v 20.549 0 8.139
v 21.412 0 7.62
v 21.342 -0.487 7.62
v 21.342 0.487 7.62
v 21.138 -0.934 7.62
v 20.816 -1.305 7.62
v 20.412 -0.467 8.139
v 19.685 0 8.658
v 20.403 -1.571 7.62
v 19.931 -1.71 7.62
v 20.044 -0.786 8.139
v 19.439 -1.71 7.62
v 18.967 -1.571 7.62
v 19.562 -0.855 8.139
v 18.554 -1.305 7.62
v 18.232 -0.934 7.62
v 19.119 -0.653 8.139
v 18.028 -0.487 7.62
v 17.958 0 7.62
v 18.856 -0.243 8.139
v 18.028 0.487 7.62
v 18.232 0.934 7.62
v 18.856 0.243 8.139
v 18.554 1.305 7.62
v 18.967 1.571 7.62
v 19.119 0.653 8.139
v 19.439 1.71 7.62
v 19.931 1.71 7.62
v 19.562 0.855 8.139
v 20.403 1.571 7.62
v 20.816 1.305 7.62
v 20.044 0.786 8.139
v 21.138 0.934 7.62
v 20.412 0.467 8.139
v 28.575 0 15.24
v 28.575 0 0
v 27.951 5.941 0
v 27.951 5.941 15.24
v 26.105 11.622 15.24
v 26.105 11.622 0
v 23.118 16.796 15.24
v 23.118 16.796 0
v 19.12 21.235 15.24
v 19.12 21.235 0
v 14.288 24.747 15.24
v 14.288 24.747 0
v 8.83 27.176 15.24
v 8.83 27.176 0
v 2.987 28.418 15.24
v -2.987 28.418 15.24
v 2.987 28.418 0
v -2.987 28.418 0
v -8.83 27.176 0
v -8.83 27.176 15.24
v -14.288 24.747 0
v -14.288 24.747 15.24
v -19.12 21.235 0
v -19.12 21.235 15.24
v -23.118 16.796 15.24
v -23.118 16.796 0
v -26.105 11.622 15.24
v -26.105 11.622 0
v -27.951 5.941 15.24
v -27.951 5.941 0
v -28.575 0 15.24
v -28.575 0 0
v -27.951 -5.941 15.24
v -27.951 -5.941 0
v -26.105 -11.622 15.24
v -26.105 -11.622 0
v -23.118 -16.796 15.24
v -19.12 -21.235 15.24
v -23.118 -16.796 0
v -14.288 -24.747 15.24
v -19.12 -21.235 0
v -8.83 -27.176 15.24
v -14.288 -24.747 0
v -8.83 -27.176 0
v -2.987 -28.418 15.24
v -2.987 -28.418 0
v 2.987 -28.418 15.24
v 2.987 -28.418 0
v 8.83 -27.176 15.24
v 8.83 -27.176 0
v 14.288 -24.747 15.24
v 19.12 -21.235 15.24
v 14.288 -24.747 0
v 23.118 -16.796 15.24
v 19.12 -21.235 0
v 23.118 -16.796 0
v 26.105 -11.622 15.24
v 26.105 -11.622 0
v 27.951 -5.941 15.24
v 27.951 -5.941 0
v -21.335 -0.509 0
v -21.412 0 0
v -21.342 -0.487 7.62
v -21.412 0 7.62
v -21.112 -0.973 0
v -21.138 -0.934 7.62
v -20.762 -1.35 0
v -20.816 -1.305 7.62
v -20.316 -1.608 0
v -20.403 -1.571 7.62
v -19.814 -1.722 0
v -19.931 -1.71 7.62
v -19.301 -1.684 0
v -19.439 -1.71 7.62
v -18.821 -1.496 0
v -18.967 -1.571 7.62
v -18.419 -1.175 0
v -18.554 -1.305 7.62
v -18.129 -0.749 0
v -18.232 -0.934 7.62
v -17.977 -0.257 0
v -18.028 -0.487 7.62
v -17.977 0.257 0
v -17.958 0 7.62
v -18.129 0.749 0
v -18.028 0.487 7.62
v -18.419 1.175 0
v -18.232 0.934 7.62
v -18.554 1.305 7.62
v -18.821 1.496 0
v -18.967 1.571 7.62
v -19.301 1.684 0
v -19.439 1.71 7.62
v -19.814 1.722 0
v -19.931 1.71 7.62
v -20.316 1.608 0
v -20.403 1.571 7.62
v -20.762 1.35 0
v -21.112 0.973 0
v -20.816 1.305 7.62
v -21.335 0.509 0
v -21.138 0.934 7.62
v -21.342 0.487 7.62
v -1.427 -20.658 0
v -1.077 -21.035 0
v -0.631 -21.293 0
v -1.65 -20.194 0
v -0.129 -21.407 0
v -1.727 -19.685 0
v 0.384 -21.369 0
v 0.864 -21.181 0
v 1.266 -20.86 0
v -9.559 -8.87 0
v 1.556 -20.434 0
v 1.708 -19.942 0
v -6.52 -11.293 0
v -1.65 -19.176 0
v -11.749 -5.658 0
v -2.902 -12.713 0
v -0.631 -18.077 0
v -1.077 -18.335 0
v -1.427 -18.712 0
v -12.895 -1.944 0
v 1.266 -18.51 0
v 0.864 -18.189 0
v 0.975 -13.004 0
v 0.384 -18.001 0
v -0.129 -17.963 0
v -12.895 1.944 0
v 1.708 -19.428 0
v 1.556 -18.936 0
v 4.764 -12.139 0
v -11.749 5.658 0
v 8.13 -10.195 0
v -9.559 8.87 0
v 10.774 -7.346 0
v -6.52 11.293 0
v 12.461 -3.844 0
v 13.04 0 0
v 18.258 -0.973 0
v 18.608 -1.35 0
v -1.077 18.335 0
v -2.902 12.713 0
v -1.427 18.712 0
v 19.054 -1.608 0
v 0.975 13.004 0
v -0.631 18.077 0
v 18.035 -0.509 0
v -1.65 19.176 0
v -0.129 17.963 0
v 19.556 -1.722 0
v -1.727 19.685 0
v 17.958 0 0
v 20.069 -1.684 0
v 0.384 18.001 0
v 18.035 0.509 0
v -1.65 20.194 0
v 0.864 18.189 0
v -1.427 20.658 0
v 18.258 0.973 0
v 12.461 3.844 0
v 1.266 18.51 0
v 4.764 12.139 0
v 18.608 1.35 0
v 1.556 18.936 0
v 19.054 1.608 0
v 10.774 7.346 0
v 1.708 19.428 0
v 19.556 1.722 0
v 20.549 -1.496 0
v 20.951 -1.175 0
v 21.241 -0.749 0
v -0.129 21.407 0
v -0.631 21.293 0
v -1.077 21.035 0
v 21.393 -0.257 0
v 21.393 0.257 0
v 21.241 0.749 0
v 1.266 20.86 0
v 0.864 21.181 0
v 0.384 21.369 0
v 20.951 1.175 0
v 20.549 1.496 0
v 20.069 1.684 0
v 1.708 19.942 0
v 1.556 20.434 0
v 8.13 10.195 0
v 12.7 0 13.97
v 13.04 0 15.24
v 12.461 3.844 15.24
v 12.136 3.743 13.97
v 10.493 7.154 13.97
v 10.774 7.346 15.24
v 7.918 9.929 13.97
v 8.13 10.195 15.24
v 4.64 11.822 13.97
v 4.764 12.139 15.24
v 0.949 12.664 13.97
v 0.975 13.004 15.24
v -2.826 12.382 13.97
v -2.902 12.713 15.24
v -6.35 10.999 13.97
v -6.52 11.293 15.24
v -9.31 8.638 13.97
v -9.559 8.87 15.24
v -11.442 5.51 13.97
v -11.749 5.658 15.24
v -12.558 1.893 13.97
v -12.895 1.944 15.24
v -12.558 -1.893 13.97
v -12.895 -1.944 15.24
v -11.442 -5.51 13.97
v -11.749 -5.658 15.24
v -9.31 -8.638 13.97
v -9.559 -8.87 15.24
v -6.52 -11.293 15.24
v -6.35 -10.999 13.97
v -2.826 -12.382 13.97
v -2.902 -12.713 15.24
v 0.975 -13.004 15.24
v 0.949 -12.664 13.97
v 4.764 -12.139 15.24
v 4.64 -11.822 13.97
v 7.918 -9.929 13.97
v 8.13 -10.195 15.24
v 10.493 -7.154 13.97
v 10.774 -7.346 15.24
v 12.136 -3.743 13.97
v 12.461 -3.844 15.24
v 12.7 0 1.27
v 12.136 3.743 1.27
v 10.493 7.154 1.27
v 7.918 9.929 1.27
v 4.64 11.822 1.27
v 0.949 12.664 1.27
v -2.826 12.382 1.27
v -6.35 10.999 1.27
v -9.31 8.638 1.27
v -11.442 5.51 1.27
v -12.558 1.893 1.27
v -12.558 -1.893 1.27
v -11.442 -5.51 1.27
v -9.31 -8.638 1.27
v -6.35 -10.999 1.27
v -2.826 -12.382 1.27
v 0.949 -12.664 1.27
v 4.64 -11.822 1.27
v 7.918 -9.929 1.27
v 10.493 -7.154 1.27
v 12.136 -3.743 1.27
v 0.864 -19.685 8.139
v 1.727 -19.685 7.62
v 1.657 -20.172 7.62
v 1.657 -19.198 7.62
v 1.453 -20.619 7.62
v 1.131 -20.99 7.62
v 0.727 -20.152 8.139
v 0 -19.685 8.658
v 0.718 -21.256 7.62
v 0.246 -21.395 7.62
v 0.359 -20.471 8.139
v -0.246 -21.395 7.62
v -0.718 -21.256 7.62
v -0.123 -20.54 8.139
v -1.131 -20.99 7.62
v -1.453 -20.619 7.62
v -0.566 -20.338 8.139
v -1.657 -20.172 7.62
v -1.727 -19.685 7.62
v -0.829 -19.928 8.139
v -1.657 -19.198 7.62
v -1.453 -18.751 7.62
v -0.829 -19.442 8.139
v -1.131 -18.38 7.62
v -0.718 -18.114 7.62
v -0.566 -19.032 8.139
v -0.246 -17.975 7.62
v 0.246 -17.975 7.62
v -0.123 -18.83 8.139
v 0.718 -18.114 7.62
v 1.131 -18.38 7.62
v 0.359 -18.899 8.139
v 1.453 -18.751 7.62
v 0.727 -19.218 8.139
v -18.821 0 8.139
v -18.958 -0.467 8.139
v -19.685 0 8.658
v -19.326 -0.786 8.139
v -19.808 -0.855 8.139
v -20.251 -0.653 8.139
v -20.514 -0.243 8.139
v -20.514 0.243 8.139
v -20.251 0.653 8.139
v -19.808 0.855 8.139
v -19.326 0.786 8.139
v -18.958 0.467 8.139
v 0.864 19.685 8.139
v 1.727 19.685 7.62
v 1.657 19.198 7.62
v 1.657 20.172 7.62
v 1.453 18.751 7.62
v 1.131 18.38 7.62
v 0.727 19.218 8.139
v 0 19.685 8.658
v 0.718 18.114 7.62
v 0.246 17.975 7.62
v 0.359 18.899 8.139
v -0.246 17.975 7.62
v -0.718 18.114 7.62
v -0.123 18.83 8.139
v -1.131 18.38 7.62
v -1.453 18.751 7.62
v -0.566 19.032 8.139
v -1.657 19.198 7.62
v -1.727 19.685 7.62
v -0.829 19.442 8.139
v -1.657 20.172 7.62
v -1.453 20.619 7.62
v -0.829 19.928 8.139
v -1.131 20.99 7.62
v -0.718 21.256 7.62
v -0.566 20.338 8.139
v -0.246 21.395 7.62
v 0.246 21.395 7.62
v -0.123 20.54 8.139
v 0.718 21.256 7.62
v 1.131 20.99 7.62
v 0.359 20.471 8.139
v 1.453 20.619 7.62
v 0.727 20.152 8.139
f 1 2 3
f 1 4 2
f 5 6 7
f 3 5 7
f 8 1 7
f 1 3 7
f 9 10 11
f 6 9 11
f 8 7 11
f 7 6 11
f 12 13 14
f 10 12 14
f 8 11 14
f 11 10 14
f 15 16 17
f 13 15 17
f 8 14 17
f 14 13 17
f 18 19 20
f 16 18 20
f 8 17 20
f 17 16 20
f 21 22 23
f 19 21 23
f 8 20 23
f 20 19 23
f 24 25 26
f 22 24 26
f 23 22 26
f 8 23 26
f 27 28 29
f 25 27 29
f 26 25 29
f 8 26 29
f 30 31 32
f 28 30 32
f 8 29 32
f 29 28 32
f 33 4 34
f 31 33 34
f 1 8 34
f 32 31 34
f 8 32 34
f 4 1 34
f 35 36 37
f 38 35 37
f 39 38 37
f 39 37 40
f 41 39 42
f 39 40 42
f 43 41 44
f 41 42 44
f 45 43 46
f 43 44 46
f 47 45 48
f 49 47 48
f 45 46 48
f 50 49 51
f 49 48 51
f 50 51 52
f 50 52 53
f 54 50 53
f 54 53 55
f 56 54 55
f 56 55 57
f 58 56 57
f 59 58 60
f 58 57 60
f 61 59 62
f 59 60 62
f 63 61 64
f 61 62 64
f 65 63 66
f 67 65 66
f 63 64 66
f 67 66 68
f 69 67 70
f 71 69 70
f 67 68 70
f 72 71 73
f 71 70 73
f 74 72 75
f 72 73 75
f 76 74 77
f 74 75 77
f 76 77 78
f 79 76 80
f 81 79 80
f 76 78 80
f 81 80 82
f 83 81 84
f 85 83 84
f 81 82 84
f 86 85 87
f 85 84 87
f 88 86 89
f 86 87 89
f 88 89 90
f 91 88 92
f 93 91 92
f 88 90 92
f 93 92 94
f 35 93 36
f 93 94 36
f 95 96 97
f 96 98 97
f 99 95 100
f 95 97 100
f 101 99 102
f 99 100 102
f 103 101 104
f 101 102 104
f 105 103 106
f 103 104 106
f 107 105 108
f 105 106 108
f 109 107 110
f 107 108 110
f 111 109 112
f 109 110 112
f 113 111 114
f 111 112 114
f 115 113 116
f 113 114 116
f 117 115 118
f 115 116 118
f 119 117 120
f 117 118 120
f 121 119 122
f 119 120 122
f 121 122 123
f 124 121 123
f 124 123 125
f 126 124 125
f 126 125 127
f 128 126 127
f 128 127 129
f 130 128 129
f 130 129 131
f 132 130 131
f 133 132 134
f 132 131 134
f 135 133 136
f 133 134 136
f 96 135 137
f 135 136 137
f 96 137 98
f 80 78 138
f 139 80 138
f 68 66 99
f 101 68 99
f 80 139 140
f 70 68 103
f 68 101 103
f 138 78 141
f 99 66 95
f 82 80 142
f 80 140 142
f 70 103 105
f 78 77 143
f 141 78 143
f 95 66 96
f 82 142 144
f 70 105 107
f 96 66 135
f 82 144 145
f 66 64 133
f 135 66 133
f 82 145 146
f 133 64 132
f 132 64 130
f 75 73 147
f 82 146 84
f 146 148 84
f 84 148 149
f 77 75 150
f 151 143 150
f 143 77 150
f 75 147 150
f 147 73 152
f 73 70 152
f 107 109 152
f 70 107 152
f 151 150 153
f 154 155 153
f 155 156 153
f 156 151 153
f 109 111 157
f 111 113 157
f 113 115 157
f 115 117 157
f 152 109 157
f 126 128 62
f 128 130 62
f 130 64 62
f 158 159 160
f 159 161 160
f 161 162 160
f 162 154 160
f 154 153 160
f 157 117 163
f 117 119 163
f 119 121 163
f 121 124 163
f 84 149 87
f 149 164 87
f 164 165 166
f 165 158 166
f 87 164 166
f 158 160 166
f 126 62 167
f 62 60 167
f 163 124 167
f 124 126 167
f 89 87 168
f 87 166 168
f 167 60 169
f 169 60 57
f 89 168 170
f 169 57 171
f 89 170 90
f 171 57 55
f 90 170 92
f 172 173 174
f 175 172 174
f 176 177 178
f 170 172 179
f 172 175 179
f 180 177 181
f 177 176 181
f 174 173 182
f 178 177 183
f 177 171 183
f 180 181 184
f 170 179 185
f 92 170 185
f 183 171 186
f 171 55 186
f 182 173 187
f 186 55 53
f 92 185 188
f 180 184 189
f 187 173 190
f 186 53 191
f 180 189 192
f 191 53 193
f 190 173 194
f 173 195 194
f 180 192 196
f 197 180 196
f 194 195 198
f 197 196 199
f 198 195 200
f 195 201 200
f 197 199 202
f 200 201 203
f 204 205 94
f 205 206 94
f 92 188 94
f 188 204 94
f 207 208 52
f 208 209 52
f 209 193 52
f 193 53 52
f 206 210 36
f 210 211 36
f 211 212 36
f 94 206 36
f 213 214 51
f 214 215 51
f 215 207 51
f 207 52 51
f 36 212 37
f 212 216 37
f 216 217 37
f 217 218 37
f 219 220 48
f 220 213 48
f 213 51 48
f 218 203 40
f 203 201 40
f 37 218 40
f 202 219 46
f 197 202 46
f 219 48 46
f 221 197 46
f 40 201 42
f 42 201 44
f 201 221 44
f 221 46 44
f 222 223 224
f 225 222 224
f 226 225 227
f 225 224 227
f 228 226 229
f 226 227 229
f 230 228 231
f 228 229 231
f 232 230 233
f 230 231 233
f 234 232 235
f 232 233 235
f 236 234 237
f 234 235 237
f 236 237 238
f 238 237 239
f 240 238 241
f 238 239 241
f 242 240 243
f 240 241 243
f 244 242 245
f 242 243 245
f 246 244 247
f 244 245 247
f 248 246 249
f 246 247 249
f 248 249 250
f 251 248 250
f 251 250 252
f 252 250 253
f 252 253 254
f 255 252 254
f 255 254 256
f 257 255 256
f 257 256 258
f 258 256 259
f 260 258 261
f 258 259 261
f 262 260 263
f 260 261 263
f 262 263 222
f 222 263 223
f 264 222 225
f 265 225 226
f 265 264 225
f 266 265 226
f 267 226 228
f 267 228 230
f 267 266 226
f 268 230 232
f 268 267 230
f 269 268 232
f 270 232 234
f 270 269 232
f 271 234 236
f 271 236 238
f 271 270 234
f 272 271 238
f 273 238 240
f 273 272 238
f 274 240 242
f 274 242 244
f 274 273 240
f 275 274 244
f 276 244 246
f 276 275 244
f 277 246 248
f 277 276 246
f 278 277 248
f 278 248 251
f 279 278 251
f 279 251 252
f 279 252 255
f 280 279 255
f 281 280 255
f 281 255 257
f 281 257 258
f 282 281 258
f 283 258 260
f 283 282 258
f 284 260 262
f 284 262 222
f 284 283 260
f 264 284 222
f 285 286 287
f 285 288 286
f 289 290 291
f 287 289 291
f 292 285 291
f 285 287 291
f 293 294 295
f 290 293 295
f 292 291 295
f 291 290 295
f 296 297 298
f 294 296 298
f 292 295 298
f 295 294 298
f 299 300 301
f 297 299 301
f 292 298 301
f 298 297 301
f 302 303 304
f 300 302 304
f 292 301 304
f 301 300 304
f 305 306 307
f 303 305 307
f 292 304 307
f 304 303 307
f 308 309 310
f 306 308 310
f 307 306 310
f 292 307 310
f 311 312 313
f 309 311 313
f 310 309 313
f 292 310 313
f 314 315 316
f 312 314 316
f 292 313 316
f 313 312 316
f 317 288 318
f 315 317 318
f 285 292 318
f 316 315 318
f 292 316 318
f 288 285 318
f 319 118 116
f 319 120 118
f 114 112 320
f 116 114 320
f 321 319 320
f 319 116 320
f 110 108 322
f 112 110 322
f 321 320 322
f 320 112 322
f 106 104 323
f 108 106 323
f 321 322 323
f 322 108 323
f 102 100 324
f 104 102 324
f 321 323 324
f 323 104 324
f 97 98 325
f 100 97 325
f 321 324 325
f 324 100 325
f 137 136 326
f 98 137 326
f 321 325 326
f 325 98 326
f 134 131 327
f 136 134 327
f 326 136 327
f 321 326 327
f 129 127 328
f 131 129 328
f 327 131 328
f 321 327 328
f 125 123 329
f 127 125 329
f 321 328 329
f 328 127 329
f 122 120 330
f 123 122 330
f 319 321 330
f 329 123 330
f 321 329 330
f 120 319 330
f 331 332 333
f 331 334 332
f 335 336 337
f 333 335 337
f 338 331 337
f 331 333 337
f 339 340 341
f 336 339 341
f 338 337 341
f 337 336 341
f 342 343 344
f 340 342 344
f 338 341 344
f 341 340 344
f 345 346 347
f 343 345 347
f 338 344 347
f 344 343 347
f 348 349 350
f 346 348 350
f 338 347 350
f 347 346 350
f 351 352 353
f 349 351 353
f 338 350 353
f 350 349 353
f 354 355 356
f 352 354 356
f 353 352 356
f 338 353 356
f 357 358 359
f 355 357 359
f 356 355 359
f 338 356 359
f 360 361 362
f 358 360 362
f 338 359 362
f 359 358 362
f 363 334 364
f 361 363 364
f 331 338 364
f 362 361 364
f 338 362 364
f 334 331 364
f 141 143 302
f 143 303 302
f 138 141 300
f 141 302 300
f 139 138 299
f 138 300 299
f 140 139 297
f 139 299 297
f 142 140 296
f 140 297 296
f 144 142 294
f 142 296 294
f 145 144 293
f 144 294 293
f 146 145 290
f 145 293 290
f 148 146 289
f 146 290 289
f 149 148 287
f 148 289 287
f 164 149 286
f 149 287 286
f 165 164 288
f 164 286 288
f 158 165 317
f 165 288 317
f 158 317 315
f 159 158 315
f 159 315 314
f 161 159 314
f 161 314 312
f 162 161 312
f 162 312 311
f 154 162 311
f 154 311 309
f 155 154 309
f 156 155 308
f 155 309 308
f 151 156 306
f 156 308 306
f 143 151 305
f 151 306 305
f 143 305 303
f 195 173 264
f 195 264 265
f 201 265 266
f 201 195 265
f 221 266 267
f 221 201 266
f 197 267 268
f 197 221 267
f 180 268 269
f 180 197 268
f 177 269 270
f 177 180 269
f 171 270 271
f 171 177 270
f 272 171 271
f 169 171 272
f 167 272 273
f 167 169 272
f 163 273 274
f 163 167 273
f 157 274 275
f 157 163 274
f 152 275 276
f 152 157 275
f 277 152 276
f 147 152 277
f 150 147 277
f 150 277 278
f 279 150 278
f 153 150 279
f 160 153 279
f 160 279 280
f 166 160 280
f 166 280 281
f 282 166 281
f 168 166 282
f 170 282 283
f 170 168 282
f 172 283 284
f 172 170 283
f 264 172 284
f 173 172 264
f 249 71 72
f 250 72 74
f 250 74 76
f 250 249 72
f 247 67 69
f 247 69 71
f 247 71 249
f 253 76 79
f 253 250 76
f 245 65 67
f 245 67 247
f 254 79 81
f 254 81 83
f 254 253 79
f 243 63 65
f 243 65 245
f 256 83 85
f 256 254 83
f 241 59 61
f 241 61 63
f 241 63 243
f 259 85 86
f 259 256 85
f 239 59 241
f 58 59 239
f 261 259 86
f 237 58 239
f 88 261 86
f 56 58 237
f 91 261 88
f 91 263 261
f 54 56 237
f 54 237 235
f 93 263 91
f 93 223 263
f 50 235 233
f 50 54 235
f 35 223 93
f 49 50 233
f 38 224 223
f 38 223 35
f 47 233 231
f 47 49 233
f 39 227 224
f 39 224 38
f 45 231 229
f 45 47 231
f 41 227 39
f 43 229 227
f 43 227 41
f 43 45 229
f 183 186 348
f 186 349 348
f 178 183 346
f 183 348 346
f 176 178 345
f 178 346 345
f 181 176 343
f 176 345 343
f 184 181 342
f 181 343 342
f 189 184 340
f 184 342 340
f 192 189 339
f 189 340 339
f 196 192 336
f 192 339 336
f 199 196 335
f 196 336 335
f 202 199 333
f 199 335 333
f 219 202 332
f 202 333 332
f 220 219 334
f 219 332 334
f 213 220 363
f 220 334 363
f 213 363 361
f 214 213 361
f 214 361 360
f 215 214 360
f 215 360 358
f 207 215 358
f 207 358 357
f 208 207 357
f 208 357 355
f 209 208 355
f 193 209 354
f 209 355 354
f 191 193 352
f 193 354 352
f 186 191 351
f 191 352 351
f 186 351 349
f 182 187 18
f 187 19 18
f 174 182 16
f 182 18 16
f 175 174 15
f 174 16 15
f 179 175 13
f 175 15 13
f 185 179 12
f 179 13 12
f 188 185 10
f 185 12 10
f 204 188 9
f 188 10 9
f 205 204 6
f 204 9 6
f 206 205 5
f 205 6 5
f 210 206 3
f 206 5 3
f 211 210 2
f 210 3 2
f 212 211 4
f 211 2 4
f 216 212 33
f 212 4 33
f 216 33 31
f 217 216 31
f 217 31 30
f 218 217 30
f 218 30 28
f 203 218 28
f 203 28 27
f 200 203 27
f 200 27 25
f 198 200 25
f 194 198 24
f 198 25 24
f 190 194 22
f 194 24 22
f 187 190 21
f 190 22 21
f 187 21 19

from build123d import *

# Parameters (mm, degrees)
F0_R     = 28.575
F0_R_2   = 12.7
F1_DEPTH = 15.24
F2_SIZE2 = 0.3402954744
F2_SIZE  = 1.27
F4_D     = 3.4544
F4_DEPTH = 7.62
F4_TIP   = 1.0378064612


with BuildPart() as f1:
    # F0 (on Top) → F1 (new body)
    with BuildSketch(Plane.XY):
        Circle(F0_R)
        Circle(F0_R_2, mode=Mode.SUBTRACT)
    extrude(amount=F1_DEPTH)

    # F2
    f2_edges = [f1.edges().sort_by_distance(p)[0] for p in [
        (-12.7, 0, 15.24),
        (-12.7, 0, 0),
    ]]
    f2_side = f1.faces().sort_by_distance((-12.7, 0, 7.62))[0]
    chamfer(f2_edges, length=F2_SIZE, length2=F2_SIZE2, reference=f2_side)

    # F4
    with Locations(Plane(origin=(0, 0, 0), x_dir=(1, 0, 0), z_dir=(0, 0, -1))):
        with Locations((0, -19.685), (-19.685, 0), (0, 19.685), (19.685, 0)):
            Hole(F4_D / 2, depth=F4_DEPTH)
            with Locations((0, 0, -(F4_DEPTH + F4_TIP / 2))):  # 118° drill point
                Cone(0, F4_D / 2, F4_TIP, mode=Mode.SUBTRACT)


solid = f1.part
